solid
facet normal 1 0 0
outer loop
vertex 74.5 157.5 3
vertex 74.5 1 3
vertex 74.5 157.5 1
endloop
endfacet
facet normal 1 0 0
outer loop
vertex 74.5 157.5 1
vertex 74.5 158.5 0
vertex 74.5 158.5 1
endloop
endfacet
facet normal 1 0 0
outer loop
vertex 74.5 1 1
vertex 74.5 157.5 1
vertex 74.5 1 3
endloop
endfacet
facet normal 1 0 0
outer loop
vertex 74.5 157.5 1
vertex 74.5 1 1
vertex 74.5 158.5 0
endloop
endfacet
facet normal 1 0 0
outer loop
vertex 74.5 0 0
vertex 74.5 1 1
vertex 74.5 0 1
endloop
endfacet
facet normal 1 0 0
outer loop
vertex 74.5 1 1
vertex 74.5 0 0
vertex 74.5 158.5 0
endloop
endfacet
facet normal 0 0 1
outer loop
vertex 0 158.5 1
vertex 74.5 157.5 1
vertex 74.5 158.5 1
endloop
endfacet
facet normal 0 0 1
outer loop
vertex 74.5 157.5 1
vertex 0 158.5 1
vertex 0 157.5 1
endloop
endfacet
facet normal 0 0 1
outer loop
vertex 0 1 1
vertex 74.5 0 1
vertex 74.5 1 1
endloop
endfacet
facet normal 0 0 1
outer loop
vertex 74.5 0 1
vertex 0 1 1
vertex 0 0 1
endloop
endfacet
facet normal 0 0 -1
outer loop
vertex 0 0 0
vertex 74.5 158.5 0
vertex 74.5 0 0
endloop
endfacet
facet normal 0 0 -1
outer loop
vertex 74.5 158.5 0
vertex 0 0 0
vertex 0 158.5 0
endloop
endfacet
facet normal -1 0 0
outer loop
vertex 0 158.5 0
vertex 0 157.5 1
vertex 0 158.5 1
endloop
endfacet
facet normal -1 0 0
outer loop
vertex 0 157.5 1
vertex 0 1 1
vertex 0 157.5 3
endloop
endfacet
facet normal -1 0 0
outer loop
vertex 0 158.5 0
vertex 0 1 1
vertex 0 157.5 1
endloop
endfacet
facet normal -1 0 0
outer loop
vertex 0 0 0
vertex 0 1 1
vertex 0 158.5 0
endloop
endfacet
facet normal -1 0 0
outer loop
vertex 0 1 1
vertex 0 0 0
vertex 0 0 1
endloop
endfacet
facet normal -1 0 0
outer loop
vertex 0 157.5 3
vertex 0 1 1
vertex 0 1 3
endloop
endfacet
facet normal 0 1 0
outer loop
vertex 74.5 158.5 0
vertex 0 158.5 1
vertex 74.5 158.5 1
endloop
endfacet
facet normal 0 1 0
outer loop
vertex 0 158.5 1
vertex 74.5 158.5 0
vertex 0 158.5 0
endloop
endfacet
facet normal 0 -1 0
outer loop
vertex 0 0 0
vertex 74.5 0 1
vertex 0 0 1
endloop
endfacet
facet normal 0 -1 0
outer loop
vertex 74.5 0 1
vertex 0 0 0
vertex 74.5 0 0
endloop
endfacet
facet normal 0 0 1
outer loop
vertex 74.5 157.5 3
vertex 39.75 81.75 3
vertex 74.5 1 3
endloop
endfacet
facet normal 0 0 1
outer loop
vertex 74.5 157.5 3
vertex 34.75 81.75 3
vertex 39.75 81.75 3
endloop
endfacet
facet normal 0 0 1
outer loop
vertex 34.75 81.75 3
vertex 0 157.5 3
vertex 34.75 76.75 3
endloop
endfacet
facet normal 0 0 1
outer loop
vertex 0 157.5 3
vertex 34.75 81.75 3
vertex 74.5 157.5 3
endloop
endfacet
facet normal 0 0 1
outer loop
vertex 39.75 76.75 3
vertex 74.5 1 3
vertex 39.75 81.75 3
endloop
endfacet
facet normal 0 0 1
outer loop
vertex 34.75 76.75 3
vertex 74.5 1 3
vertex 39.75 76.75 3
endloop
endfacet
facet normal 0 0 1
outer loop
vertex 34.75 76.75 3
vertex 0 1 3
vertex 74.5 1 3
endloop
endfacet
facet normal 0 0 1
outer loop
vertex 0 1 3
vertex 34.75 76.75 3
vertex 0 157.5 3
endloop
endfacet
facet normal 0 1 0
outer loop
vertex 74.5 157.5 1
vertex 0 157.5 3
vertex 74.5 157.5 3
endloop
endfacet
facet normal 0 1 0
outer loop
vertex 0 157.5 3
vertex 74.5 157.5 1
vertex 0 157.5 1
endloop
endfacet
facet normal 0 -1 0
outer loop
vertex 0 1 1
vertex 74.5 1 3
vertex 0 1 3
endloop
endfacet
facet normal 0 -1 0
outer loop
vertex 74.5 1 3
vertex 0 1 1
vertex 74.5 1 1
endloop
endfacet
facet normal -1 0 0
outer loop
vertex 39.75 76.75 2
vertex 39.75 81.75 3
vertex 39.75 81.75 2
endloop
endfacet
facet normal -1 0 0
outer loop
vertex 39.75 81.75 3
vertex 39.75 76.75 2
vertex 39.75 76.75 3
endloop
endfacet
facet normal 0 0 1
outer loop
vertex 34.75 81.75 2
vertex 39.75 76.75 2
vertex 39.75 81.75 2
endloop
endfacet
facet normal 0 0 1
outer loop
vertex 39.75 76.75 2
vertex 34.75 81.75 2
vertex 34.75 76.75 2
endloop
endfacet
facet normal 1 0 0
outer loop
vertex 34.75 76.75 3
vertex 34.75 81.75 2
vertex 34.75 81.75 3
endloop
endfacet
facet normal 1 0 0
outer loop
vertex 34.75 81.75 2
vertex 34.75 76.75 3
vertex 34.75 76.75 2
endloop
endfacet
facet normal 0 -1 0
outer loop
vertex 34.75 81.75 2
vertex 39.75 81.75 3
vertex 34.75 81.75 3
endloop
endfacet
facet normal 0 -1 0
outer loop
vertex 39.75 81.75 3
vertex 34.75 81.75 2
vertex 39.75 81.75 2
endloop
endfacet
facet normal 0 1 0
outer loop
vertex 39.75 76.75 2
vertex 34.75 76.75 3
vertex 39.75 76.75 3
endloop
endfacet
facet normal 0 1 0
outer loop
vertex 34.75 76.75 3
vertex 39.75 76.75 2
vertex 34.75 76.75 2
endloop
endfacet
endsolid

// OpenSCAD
DIM = [
	76.5, // Spielerinnenablage richtung
	160.5, // Links-Rechts
	29
];



difference(){

	union(){
		cube([ DIM.x-2 , DIM.y-2 , 1 ]);
		translate([ 0 , 1 , 1 ]) cube([ DIM.x-2 , DIM.y-4 , 2 ]);
	}
	
	// Symbol
	translate([ 0.5*(DIM.x-2) , 0.5*(DIM.y-2) , 2 ]) Symbol();
}

module Symbol () {
	
	Z = 2;
	translate([0,0,0.5*Z]) cube([5,5,Z],center=true);
	
}
